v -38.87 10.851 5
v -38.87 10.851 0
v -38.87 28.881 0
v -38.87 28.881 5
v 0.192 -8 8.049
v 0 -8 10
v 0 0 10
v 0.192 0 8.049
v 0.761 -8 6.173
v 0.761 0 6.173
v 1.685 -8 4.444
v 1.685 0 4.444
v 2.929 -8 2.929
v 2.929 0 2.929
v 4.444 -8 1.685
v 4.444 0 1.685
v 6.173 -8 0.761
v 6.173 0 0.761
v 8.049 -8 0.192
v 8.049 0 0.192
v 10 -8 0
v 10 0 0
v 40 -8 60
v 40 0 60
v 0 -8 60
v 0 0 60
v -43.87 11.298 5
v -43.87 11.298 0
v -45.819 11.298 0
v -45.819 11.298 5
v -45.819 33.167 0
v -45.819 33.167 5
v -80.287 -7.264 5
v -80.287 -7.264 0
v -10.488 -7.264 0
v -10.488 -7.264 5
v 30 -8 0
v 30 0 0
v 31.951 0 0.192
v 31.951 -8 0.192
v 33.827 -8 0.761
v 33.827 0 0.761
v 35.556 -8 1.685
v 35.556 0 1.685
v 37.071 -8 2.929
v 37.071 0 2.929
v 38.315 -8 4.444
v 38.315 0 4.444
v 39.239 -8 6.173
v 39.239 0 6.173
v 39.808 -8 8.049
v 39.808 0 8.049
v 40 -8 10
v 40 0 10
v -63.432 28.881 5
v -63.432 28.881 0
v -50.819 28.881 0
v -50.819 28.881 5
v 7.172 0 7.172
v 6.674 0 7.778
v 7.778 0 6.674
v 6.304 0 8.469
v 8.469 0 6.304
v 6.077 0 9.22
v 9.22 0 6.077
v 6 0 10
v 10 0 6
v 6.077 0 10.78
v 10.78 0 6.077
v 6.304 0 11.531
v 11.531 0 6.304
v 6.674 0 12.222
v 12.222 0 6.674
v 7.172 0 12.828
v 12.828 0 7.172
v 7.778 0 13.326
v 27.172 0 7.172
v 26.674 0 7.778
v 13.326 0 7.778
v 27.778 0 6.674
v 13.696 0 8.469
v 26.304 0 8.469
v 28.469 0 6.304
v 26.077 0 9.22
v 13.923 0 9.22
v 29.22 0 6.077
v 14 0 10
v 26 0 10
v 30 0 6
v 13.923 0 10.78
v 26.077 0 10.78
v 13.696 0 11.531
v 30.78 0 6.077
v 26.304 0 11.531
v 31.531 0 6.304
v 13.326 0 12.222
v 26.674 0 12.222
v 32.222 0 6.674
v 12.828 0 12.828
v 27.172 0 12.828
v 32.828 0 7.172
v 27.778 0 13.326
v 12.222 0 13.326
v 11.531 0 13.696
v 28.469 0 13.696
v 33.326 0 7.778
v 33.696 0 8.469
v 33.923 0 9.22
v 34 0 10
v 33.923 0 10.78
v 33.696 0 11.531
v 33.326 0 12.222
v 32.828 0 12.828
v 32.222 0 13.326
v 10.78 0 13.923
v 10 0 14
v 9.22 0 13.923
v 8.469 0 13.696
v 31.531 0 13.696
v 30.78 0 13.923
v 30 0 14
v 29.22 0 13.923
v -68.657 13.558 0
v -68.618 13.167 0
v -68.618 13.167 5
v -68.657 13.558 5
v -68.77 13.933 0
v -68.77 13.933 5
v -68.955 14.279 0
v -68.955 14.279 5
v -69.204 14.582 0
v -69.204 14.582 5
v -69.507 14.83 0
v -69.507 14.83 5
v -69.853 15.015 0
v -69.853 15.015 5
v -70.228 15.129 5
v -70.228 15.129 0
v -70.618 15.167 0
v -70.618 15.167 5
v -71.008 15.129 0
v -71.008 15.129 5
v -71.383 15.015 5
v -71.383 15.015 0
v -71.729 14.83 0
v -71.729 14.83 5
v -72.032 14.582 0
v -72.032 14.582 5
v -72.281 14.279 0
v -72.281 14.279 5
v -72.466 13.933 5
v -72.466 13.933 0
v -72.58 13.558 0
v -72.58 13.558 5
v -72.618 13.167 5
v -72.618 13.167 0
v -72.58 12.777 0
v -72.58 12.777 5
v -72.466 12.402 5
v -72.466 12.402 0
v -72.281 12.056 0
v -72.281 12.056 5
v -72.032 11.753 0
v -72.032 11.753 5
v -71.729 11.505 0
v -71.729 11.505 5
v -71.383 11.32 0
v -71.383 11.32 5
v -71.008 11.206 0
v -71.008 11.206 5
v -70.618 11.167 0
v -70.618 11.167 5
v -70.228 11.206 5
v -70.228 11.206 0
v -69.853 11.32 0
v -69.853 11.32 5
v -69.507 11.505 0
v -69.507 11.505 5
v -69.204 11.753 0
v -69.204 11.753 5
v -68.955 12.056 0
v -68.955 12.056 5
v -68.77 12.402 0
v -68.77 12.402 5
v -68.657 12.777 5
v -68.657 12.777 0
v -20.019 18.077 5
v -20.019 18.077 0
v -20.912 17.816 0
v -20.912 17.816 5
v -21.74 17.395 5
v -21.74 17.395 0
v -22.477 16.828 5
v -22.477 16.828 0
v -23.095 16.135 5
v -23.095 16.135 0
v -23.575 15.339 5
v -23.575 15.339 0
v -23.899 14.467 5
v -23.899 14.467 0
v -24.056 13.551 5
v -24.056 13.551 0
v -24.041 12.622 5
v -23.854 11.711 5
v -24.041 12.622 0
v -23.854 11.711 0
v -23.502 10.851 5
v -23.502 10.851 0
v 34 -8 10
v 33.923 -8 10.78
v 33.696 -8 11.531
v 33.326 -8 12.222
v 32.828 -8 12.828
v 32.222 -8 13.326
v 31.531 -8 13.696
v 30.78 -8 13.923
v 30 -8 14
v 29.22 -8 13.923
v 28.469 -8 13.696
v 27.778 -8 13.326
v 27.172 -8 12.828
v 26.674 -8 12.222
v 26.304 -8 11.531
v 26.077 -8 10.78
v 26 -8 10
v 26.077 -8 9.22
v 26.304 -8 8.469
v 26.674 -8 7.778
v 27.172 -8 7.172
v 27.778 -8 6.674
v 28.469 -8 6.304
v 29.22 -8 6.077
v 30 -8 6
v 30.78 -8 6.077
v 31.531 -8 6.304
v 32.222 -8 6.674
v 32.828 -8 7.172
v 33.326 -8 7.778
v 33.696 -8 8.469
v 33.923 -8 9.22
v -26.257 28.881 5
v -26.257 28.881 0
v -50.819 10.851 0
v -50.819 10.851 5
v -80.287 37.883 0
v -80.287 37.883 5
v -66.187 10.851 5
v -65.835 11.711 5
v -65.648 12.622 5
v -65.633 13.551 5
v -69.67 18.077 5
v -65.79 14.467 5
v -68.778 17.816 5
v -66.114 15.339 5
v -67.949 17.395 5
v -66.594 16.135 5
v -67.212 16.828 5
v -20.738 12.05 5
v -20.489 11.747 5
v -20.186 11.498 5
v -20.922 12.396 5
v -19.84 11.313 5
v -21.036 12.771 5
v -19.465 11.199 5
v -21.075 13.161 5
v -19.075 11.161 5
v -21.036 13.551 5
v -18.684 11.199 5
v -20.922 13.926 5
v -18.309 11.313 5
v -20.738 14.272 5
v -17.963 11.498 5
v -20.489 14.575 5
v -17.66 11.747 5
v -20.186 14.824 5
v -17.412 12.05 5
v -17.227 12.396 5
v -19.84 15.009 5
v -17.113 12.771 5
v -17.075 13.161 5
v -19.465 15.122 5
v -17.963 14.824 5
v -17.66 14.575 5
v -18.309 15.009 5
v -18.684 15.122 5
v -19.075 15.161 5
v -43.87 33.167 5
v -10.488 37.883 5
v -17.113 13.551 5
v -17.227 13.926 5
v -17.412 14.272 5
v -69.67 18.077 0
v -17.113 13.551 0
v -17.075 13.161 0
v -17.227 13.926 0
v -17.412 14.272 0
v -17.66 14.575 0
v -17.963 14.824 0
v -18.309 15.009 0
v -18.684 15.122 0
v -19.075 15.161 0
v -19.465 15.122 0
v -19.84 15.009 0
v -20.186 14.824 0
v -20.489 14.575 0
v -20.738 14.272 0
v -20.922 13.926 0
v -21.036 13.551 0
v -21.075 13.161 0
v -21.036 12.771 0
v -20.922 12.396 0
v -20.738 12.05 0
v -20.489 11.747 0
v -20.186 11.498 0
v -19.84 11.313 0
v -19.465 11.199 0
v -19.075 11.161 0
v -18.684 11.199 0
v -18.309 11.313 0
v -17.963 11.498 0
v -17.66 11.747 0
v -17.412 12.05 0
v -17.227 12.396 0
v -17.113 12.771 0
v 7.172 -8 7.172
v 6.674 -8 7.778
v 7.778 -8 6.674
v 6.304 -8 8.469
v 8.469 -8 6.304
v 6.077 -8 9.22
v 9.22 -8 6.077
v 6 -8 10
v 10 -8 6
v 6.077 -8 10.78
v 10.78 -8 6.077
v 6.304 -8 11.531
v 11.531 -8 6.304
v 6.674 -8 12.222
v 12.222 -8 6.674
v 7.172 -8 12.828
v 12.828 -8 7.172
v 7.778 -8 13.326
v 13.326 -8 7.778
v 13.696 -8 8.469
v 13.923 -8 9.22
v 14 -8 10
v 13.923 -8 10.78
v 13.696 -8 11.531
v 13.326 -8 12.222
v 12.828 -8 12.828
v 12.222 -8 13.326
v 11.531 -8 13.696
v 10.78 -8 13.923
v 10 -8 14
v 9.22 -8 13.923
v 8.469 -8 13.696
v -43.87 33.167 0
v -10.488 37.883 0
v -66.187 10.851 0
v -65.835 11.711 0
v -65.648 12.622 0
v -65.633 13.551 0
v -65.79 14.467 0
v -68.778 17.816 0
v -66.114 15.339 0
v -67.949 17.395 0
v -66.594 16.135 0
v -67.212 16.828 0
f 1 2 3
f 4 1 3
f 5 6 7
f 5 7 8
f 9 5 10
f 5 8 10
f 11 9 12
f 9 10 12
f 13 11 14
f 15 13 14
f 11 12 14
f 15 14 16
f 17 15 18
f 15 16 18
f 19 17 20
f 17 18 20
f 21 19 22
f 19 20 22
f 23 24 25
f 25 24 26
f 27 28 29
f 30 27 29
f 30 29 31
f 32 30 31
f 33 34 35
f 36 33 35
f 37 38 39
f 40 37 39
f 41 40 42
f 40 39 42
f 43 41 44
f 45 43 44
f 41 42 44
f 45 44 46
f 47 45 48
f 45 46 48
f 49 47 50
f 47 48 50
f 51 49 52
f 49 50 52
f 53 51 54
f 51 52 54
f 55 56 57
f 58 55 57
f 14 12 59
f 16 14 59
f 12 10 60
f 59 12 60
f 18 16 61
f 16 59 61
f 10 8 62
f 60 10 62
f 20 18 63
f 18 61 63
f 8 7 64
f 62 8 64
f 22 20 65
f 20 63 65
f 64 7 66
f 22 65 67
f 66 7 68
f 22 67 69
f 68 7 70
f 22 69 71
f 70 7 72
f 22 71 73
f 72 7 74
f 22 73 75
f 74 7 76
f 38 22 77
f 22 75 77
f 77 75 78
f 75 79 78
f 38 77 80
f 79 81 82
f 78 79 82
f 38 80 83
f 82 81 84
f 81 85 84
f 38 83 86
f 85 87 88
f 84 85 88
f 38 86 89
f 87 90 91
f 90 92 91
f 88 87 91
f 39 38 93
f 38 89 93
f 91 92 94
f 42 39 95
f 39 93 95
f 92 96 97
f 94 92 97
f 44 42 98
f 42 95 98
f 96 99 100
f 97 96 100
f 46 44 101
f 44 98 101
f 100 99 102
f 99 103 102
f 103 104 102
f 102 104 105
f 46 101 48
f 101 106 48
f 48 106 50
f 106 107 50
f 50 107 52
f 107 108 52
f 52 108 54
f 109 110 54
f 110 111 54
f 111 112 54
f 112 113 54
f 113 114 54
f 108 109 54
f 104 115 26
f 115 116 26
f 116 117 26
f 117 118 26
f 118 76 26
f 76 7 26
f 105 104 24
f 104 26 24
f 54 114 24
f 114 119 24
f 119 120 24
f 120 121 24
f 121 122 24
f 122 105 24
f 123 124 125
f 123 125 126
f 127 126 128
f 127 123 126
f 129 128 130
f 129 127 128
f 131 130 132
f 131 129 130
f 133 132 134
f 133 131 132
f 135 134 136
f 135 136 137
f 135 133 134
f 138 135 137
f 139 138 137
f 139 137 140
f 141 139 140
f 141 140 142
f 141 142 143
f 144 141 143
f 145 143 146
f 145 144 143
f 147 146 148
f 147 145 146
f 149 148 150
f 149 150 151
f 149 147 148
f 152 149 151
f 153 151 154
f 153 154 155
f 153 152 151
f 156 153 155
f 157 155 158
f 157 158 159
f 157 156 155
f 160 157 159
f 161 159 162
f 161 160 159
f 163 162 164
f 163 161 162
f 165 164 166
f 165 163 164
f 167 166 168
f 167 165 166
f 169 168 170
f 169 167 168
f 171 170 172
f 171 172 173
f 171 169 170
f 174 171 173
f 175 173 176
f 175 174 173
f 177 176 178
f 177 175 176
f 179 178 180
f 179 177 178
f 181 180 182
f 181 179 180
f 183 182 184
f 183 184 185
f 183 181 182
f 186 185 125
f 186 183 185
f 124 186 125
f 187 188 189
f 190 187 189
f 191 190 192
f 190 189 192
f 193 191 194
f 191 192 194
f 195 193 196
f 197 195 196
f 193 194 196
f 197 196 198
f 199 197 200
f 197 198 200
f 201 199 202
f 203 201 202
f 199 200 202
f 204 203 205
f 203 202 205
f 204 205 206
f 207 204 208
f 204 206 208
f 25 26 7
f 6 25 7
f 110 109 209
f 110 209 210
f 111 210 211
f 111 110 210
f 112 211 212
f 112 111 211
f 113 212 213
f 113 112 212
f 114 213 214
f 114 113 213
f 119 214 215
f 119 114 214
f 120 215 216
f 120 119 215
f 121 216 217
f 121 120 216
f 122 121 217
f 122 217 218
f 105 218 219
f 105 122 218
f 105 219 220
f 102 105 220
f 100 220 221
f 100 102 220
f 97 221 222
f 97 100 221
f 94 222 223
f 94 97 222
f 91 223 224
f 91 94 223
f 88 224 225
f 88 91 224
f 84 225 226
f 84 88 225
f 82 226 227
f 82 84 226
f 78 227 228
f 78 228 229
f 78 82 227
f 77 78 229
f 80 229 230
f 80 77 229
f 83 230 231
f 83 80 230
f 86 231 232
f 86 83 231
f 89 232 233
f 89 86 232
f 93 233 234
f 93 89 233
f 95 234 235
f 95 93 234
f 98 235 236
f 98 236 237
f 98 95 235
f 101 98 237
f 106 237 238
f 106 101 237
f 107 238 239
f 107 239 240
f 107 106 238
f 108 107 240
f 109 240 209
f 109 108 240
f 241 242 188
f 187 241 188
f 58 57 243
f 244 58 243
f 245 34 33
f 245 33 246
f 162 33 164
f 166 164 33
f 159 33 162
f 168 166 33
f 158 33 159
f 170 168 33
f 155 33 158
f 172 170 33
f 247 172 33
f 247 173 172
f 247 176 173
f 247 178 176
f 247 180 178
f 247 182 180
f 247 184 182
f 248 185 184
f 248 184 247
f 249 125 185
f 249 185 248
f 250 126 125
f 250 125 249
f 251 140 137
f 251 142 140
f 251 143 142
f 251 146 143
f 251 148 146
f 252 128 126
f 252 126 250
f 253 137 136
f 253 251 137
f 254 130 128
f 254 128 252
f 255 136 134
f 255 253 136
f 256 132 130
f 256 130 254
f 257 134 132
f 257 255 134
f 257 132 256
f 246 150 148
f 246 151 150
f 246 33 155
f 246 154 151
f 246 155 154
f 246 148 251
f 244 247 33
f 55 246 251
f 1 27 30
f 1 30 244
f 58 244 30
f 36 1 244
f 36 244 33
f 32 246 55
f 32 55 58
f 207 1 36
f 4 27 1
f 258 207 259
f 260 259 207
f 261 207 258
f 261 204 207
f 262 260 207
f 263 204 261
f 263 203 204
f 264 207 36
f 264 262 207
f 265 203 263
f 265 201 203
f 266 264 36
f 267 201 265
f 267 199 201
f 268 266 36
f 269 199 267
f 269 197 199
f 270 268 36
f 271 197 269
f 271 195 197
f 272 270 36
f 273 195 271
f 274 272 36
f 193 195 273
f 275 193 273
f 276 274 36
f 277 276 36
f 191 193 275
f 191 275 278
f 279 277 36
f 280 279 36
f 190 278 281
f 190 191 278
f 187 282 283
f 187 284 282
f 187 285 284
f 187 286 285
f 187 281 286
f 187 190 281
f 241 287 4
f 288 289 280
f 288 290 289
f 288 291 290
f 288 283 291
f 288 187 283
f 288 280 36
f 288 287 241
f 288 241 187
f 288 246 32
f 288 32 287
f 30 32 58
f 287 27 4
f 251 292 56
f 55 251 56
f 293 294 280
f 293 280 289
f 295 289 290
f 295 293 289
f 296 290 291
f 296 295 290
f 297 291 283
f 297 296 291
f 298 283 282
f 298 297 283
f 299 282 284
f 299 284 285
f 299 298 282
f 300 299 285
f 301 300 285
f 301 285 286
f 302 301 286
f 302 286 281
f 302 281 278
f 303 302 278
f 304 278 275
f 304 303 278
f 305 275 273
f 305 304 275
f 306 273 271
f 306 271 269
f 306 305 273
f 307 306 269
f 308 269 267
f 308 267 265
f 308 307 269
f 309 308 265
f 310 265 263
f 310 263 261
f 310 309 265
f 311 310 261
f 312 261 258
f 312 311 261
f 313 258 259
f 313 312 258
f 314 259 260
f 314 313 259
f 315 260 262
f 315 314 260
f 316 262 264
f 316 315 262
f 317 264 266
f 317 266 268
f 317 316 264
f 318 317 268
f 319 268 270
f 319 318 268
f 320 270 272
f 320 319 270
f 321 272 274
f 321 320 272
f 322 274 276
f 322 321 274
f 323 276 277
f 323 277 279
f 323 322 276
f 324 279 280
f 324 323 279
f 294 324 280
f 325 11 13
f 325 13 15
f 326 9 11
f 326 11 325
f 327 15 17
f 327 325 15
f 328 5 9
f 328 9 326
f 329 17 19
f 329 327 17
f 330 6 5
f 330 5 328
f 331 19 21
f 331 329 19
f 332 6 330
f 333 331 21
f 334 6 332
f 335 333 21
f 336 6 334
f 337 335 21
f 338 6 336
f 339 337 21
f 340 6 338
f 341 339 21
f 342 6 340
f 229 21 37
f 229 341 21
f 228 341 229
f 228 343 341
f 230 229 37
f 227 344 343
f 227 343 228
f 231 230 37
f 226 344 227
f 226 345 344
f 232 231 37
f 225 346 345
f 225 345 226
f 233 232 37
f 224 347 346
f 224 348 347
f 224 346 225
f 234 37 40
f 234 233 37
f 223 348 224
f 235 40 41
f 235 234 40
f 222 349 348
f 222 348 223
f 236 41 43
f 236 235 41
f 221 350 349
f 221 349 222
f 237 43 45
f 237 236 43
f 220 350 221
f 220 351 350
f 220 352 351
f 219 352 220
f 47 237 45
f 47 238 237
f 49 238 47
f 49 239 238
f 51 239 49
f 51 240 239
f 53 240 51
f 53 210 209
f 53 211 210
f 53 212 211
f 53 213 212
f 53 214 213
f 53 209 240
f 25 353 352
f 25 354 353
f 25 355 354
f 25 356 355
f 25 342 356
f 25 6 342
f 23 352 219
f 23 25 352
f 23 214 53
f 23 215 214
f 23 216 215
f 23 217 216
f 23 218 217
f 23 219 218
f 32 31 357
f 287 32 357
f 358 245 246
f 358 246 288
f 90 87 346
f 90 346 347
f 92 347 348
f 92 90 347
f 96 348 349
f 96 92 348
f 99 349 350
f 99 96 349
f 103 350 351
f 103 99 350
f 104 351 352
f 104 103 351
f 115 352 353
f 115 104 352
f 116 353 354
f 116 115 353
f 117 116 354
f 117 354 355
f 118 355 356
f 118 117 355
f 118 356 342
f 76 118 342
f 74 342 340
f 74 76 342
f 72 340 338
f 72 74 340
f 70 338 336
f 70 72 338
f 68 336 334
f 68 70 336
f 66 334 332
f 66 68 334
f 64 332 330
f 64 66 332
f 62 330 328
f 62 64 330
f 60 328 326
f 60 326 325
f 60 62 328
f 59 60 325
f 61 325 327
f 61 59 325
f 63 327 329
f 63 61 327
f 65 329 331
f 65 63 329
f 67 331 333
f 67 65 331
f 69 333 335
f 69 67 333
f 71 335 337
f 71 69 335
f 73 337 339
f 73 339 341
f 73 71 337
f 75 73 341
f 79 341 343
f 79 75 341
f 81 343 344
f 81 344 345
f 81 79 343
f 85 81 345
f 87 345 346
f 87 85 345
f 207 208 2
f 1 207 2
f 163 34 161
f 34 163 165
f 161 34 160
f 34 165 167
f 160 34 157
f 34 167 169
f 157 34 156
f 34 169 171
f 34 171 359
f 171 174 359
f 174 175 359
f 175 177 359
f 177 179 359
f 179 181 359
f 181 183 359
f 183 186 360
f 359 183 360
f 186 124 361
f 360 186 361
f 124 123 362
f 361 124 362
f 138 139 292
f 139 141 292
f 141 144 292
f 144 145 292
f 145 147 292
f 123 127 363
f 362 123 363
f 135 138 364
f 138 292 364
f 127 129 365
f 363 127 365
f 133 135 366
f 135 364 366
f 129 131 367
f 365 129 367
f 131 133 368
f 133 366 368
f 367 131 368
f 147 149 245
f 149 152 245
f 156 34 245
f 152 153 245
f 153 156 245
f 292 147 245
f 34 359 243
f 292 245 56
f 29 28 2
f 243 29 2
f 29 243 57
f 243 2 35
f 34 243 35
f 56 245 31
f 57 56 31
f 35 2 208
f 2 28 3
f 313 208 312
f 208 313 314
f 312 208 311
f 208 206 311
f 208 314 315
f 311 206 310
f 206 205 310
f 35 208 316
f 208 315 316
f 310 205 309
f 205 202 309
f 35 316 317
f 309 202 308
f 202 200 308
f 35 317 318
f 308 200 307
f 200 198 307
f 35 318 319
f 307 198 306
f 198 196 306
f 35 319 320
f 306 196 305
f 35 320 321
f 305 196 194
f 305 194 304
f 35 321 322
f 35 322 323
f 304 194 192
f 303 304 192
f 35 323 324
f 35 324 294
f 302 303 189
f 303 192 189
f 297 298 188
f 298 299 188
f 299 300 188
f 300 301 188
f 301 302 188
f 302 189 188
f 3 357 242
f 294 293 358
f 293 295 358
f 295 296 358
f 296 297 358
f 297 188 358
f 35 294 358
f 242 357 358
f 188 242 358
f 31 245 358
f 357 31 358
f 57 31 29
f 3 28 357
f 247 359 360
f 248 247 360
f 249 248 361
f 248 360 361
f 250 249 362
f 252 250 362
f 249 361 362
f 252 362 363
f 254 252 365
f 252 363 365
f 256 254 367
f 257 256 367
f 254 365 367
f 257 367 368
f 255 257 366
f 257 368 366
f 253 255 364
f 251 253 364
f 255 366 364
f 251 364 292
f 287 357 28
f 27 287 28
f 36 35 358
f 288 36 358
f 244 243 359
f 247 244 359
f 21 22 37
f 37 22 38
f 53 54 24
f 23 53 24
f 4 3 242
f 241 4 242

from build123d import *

# Parameters (mm, degrees)
F0_R     = 4
F1_DEPTH = 8
F2_W     = 69.799086
F2_H     = 45.147397
F2_R     = 2
F3_DEPTH = 5


with BuildPart() as f1:
    # F0 (on Front) → F1 (new body)
    with BuildSketch(Plane.XZ):
        with BuildLine():
            ThreePointArc((0, 10), (2.928932, 2.928932), (10, 0))
            Line((10, 0), (30, 0))
            ThreePointArc((30, 0), (37.071068, 2.928932), (40, 10))
            Line((40, 10), (40, 60))
            Line((40, 60), (0, 60))
            Line((0, 60), (0, 10))
        make_face()
        with Locations((10, 10)):
            Circle(F0_R, mode=Mode.SUBTRACT)
        with Locations((30, 10)):
            Circle(F0_R, mode=Mode.SUBTRACT)
    extrude(amount=F1_DEPTH)


with BuildPart() as f3:
    # F2 (on Top) → F3 (new body)
    with BuildSketch(Plane.XY):
        with Locations((-45.387489, 15.309483)):
            Rectangle(F2_W, F2_H)
        with Locations((-70.618095, 13.16747)):
            Circle(F2_R, mode=Mode.SUBTRACT)
        with Locations((-19.074593, 13.160896)):
            Circle(F2_R, mode=Mode.SUBTRACT)
        with BuildLine():
            Line((-50.819374, 10.851256), (-66.186938, 10.851256))
            ThreePointArc((-66.186938, 10.851256), (-66.114042, 15.338531), (-69.669783, 18.076717))
            Line((-69.669783, 18.076717), (-63.432109, 28.880685))
            Line((-63.432109, 28.880685), (-50.819374, 28.880685))
            Line((-50.819374, 28.880685), (-50.819374, 10.851256))
        make_face(mode=Mode.SUBTRACT)
        with BuildLine():
            Line((-23.502247, 10.851256), (-38.869811, 10.851256))
            Line((-38.869811, 10.851256), (-38.869811, 28.880685))
            Line((-38.869811, 28.880685), (-26.257076, 28.880685))
            Line((-26.257076, 28.880685), (-20.019403, 18.076717))
            ThreePointArc((-20.019403, 18.076717), (-23.575143, 15.338531), (-23.502247, 10.851256))
        make_face(mode=Mode.SUBTRACT)
        Polygon((-45.819374, 11.297984), (-45.819374, 33.16747), (-43.869811, 33.16747), (-43.869811, 11.297984), (-44.844593, 11.297984), align=None, mode=Mode.SUBTRACT)
    extrude(amount=F3_DEPTH)


solid = Compound([f1.part, f3.part])
